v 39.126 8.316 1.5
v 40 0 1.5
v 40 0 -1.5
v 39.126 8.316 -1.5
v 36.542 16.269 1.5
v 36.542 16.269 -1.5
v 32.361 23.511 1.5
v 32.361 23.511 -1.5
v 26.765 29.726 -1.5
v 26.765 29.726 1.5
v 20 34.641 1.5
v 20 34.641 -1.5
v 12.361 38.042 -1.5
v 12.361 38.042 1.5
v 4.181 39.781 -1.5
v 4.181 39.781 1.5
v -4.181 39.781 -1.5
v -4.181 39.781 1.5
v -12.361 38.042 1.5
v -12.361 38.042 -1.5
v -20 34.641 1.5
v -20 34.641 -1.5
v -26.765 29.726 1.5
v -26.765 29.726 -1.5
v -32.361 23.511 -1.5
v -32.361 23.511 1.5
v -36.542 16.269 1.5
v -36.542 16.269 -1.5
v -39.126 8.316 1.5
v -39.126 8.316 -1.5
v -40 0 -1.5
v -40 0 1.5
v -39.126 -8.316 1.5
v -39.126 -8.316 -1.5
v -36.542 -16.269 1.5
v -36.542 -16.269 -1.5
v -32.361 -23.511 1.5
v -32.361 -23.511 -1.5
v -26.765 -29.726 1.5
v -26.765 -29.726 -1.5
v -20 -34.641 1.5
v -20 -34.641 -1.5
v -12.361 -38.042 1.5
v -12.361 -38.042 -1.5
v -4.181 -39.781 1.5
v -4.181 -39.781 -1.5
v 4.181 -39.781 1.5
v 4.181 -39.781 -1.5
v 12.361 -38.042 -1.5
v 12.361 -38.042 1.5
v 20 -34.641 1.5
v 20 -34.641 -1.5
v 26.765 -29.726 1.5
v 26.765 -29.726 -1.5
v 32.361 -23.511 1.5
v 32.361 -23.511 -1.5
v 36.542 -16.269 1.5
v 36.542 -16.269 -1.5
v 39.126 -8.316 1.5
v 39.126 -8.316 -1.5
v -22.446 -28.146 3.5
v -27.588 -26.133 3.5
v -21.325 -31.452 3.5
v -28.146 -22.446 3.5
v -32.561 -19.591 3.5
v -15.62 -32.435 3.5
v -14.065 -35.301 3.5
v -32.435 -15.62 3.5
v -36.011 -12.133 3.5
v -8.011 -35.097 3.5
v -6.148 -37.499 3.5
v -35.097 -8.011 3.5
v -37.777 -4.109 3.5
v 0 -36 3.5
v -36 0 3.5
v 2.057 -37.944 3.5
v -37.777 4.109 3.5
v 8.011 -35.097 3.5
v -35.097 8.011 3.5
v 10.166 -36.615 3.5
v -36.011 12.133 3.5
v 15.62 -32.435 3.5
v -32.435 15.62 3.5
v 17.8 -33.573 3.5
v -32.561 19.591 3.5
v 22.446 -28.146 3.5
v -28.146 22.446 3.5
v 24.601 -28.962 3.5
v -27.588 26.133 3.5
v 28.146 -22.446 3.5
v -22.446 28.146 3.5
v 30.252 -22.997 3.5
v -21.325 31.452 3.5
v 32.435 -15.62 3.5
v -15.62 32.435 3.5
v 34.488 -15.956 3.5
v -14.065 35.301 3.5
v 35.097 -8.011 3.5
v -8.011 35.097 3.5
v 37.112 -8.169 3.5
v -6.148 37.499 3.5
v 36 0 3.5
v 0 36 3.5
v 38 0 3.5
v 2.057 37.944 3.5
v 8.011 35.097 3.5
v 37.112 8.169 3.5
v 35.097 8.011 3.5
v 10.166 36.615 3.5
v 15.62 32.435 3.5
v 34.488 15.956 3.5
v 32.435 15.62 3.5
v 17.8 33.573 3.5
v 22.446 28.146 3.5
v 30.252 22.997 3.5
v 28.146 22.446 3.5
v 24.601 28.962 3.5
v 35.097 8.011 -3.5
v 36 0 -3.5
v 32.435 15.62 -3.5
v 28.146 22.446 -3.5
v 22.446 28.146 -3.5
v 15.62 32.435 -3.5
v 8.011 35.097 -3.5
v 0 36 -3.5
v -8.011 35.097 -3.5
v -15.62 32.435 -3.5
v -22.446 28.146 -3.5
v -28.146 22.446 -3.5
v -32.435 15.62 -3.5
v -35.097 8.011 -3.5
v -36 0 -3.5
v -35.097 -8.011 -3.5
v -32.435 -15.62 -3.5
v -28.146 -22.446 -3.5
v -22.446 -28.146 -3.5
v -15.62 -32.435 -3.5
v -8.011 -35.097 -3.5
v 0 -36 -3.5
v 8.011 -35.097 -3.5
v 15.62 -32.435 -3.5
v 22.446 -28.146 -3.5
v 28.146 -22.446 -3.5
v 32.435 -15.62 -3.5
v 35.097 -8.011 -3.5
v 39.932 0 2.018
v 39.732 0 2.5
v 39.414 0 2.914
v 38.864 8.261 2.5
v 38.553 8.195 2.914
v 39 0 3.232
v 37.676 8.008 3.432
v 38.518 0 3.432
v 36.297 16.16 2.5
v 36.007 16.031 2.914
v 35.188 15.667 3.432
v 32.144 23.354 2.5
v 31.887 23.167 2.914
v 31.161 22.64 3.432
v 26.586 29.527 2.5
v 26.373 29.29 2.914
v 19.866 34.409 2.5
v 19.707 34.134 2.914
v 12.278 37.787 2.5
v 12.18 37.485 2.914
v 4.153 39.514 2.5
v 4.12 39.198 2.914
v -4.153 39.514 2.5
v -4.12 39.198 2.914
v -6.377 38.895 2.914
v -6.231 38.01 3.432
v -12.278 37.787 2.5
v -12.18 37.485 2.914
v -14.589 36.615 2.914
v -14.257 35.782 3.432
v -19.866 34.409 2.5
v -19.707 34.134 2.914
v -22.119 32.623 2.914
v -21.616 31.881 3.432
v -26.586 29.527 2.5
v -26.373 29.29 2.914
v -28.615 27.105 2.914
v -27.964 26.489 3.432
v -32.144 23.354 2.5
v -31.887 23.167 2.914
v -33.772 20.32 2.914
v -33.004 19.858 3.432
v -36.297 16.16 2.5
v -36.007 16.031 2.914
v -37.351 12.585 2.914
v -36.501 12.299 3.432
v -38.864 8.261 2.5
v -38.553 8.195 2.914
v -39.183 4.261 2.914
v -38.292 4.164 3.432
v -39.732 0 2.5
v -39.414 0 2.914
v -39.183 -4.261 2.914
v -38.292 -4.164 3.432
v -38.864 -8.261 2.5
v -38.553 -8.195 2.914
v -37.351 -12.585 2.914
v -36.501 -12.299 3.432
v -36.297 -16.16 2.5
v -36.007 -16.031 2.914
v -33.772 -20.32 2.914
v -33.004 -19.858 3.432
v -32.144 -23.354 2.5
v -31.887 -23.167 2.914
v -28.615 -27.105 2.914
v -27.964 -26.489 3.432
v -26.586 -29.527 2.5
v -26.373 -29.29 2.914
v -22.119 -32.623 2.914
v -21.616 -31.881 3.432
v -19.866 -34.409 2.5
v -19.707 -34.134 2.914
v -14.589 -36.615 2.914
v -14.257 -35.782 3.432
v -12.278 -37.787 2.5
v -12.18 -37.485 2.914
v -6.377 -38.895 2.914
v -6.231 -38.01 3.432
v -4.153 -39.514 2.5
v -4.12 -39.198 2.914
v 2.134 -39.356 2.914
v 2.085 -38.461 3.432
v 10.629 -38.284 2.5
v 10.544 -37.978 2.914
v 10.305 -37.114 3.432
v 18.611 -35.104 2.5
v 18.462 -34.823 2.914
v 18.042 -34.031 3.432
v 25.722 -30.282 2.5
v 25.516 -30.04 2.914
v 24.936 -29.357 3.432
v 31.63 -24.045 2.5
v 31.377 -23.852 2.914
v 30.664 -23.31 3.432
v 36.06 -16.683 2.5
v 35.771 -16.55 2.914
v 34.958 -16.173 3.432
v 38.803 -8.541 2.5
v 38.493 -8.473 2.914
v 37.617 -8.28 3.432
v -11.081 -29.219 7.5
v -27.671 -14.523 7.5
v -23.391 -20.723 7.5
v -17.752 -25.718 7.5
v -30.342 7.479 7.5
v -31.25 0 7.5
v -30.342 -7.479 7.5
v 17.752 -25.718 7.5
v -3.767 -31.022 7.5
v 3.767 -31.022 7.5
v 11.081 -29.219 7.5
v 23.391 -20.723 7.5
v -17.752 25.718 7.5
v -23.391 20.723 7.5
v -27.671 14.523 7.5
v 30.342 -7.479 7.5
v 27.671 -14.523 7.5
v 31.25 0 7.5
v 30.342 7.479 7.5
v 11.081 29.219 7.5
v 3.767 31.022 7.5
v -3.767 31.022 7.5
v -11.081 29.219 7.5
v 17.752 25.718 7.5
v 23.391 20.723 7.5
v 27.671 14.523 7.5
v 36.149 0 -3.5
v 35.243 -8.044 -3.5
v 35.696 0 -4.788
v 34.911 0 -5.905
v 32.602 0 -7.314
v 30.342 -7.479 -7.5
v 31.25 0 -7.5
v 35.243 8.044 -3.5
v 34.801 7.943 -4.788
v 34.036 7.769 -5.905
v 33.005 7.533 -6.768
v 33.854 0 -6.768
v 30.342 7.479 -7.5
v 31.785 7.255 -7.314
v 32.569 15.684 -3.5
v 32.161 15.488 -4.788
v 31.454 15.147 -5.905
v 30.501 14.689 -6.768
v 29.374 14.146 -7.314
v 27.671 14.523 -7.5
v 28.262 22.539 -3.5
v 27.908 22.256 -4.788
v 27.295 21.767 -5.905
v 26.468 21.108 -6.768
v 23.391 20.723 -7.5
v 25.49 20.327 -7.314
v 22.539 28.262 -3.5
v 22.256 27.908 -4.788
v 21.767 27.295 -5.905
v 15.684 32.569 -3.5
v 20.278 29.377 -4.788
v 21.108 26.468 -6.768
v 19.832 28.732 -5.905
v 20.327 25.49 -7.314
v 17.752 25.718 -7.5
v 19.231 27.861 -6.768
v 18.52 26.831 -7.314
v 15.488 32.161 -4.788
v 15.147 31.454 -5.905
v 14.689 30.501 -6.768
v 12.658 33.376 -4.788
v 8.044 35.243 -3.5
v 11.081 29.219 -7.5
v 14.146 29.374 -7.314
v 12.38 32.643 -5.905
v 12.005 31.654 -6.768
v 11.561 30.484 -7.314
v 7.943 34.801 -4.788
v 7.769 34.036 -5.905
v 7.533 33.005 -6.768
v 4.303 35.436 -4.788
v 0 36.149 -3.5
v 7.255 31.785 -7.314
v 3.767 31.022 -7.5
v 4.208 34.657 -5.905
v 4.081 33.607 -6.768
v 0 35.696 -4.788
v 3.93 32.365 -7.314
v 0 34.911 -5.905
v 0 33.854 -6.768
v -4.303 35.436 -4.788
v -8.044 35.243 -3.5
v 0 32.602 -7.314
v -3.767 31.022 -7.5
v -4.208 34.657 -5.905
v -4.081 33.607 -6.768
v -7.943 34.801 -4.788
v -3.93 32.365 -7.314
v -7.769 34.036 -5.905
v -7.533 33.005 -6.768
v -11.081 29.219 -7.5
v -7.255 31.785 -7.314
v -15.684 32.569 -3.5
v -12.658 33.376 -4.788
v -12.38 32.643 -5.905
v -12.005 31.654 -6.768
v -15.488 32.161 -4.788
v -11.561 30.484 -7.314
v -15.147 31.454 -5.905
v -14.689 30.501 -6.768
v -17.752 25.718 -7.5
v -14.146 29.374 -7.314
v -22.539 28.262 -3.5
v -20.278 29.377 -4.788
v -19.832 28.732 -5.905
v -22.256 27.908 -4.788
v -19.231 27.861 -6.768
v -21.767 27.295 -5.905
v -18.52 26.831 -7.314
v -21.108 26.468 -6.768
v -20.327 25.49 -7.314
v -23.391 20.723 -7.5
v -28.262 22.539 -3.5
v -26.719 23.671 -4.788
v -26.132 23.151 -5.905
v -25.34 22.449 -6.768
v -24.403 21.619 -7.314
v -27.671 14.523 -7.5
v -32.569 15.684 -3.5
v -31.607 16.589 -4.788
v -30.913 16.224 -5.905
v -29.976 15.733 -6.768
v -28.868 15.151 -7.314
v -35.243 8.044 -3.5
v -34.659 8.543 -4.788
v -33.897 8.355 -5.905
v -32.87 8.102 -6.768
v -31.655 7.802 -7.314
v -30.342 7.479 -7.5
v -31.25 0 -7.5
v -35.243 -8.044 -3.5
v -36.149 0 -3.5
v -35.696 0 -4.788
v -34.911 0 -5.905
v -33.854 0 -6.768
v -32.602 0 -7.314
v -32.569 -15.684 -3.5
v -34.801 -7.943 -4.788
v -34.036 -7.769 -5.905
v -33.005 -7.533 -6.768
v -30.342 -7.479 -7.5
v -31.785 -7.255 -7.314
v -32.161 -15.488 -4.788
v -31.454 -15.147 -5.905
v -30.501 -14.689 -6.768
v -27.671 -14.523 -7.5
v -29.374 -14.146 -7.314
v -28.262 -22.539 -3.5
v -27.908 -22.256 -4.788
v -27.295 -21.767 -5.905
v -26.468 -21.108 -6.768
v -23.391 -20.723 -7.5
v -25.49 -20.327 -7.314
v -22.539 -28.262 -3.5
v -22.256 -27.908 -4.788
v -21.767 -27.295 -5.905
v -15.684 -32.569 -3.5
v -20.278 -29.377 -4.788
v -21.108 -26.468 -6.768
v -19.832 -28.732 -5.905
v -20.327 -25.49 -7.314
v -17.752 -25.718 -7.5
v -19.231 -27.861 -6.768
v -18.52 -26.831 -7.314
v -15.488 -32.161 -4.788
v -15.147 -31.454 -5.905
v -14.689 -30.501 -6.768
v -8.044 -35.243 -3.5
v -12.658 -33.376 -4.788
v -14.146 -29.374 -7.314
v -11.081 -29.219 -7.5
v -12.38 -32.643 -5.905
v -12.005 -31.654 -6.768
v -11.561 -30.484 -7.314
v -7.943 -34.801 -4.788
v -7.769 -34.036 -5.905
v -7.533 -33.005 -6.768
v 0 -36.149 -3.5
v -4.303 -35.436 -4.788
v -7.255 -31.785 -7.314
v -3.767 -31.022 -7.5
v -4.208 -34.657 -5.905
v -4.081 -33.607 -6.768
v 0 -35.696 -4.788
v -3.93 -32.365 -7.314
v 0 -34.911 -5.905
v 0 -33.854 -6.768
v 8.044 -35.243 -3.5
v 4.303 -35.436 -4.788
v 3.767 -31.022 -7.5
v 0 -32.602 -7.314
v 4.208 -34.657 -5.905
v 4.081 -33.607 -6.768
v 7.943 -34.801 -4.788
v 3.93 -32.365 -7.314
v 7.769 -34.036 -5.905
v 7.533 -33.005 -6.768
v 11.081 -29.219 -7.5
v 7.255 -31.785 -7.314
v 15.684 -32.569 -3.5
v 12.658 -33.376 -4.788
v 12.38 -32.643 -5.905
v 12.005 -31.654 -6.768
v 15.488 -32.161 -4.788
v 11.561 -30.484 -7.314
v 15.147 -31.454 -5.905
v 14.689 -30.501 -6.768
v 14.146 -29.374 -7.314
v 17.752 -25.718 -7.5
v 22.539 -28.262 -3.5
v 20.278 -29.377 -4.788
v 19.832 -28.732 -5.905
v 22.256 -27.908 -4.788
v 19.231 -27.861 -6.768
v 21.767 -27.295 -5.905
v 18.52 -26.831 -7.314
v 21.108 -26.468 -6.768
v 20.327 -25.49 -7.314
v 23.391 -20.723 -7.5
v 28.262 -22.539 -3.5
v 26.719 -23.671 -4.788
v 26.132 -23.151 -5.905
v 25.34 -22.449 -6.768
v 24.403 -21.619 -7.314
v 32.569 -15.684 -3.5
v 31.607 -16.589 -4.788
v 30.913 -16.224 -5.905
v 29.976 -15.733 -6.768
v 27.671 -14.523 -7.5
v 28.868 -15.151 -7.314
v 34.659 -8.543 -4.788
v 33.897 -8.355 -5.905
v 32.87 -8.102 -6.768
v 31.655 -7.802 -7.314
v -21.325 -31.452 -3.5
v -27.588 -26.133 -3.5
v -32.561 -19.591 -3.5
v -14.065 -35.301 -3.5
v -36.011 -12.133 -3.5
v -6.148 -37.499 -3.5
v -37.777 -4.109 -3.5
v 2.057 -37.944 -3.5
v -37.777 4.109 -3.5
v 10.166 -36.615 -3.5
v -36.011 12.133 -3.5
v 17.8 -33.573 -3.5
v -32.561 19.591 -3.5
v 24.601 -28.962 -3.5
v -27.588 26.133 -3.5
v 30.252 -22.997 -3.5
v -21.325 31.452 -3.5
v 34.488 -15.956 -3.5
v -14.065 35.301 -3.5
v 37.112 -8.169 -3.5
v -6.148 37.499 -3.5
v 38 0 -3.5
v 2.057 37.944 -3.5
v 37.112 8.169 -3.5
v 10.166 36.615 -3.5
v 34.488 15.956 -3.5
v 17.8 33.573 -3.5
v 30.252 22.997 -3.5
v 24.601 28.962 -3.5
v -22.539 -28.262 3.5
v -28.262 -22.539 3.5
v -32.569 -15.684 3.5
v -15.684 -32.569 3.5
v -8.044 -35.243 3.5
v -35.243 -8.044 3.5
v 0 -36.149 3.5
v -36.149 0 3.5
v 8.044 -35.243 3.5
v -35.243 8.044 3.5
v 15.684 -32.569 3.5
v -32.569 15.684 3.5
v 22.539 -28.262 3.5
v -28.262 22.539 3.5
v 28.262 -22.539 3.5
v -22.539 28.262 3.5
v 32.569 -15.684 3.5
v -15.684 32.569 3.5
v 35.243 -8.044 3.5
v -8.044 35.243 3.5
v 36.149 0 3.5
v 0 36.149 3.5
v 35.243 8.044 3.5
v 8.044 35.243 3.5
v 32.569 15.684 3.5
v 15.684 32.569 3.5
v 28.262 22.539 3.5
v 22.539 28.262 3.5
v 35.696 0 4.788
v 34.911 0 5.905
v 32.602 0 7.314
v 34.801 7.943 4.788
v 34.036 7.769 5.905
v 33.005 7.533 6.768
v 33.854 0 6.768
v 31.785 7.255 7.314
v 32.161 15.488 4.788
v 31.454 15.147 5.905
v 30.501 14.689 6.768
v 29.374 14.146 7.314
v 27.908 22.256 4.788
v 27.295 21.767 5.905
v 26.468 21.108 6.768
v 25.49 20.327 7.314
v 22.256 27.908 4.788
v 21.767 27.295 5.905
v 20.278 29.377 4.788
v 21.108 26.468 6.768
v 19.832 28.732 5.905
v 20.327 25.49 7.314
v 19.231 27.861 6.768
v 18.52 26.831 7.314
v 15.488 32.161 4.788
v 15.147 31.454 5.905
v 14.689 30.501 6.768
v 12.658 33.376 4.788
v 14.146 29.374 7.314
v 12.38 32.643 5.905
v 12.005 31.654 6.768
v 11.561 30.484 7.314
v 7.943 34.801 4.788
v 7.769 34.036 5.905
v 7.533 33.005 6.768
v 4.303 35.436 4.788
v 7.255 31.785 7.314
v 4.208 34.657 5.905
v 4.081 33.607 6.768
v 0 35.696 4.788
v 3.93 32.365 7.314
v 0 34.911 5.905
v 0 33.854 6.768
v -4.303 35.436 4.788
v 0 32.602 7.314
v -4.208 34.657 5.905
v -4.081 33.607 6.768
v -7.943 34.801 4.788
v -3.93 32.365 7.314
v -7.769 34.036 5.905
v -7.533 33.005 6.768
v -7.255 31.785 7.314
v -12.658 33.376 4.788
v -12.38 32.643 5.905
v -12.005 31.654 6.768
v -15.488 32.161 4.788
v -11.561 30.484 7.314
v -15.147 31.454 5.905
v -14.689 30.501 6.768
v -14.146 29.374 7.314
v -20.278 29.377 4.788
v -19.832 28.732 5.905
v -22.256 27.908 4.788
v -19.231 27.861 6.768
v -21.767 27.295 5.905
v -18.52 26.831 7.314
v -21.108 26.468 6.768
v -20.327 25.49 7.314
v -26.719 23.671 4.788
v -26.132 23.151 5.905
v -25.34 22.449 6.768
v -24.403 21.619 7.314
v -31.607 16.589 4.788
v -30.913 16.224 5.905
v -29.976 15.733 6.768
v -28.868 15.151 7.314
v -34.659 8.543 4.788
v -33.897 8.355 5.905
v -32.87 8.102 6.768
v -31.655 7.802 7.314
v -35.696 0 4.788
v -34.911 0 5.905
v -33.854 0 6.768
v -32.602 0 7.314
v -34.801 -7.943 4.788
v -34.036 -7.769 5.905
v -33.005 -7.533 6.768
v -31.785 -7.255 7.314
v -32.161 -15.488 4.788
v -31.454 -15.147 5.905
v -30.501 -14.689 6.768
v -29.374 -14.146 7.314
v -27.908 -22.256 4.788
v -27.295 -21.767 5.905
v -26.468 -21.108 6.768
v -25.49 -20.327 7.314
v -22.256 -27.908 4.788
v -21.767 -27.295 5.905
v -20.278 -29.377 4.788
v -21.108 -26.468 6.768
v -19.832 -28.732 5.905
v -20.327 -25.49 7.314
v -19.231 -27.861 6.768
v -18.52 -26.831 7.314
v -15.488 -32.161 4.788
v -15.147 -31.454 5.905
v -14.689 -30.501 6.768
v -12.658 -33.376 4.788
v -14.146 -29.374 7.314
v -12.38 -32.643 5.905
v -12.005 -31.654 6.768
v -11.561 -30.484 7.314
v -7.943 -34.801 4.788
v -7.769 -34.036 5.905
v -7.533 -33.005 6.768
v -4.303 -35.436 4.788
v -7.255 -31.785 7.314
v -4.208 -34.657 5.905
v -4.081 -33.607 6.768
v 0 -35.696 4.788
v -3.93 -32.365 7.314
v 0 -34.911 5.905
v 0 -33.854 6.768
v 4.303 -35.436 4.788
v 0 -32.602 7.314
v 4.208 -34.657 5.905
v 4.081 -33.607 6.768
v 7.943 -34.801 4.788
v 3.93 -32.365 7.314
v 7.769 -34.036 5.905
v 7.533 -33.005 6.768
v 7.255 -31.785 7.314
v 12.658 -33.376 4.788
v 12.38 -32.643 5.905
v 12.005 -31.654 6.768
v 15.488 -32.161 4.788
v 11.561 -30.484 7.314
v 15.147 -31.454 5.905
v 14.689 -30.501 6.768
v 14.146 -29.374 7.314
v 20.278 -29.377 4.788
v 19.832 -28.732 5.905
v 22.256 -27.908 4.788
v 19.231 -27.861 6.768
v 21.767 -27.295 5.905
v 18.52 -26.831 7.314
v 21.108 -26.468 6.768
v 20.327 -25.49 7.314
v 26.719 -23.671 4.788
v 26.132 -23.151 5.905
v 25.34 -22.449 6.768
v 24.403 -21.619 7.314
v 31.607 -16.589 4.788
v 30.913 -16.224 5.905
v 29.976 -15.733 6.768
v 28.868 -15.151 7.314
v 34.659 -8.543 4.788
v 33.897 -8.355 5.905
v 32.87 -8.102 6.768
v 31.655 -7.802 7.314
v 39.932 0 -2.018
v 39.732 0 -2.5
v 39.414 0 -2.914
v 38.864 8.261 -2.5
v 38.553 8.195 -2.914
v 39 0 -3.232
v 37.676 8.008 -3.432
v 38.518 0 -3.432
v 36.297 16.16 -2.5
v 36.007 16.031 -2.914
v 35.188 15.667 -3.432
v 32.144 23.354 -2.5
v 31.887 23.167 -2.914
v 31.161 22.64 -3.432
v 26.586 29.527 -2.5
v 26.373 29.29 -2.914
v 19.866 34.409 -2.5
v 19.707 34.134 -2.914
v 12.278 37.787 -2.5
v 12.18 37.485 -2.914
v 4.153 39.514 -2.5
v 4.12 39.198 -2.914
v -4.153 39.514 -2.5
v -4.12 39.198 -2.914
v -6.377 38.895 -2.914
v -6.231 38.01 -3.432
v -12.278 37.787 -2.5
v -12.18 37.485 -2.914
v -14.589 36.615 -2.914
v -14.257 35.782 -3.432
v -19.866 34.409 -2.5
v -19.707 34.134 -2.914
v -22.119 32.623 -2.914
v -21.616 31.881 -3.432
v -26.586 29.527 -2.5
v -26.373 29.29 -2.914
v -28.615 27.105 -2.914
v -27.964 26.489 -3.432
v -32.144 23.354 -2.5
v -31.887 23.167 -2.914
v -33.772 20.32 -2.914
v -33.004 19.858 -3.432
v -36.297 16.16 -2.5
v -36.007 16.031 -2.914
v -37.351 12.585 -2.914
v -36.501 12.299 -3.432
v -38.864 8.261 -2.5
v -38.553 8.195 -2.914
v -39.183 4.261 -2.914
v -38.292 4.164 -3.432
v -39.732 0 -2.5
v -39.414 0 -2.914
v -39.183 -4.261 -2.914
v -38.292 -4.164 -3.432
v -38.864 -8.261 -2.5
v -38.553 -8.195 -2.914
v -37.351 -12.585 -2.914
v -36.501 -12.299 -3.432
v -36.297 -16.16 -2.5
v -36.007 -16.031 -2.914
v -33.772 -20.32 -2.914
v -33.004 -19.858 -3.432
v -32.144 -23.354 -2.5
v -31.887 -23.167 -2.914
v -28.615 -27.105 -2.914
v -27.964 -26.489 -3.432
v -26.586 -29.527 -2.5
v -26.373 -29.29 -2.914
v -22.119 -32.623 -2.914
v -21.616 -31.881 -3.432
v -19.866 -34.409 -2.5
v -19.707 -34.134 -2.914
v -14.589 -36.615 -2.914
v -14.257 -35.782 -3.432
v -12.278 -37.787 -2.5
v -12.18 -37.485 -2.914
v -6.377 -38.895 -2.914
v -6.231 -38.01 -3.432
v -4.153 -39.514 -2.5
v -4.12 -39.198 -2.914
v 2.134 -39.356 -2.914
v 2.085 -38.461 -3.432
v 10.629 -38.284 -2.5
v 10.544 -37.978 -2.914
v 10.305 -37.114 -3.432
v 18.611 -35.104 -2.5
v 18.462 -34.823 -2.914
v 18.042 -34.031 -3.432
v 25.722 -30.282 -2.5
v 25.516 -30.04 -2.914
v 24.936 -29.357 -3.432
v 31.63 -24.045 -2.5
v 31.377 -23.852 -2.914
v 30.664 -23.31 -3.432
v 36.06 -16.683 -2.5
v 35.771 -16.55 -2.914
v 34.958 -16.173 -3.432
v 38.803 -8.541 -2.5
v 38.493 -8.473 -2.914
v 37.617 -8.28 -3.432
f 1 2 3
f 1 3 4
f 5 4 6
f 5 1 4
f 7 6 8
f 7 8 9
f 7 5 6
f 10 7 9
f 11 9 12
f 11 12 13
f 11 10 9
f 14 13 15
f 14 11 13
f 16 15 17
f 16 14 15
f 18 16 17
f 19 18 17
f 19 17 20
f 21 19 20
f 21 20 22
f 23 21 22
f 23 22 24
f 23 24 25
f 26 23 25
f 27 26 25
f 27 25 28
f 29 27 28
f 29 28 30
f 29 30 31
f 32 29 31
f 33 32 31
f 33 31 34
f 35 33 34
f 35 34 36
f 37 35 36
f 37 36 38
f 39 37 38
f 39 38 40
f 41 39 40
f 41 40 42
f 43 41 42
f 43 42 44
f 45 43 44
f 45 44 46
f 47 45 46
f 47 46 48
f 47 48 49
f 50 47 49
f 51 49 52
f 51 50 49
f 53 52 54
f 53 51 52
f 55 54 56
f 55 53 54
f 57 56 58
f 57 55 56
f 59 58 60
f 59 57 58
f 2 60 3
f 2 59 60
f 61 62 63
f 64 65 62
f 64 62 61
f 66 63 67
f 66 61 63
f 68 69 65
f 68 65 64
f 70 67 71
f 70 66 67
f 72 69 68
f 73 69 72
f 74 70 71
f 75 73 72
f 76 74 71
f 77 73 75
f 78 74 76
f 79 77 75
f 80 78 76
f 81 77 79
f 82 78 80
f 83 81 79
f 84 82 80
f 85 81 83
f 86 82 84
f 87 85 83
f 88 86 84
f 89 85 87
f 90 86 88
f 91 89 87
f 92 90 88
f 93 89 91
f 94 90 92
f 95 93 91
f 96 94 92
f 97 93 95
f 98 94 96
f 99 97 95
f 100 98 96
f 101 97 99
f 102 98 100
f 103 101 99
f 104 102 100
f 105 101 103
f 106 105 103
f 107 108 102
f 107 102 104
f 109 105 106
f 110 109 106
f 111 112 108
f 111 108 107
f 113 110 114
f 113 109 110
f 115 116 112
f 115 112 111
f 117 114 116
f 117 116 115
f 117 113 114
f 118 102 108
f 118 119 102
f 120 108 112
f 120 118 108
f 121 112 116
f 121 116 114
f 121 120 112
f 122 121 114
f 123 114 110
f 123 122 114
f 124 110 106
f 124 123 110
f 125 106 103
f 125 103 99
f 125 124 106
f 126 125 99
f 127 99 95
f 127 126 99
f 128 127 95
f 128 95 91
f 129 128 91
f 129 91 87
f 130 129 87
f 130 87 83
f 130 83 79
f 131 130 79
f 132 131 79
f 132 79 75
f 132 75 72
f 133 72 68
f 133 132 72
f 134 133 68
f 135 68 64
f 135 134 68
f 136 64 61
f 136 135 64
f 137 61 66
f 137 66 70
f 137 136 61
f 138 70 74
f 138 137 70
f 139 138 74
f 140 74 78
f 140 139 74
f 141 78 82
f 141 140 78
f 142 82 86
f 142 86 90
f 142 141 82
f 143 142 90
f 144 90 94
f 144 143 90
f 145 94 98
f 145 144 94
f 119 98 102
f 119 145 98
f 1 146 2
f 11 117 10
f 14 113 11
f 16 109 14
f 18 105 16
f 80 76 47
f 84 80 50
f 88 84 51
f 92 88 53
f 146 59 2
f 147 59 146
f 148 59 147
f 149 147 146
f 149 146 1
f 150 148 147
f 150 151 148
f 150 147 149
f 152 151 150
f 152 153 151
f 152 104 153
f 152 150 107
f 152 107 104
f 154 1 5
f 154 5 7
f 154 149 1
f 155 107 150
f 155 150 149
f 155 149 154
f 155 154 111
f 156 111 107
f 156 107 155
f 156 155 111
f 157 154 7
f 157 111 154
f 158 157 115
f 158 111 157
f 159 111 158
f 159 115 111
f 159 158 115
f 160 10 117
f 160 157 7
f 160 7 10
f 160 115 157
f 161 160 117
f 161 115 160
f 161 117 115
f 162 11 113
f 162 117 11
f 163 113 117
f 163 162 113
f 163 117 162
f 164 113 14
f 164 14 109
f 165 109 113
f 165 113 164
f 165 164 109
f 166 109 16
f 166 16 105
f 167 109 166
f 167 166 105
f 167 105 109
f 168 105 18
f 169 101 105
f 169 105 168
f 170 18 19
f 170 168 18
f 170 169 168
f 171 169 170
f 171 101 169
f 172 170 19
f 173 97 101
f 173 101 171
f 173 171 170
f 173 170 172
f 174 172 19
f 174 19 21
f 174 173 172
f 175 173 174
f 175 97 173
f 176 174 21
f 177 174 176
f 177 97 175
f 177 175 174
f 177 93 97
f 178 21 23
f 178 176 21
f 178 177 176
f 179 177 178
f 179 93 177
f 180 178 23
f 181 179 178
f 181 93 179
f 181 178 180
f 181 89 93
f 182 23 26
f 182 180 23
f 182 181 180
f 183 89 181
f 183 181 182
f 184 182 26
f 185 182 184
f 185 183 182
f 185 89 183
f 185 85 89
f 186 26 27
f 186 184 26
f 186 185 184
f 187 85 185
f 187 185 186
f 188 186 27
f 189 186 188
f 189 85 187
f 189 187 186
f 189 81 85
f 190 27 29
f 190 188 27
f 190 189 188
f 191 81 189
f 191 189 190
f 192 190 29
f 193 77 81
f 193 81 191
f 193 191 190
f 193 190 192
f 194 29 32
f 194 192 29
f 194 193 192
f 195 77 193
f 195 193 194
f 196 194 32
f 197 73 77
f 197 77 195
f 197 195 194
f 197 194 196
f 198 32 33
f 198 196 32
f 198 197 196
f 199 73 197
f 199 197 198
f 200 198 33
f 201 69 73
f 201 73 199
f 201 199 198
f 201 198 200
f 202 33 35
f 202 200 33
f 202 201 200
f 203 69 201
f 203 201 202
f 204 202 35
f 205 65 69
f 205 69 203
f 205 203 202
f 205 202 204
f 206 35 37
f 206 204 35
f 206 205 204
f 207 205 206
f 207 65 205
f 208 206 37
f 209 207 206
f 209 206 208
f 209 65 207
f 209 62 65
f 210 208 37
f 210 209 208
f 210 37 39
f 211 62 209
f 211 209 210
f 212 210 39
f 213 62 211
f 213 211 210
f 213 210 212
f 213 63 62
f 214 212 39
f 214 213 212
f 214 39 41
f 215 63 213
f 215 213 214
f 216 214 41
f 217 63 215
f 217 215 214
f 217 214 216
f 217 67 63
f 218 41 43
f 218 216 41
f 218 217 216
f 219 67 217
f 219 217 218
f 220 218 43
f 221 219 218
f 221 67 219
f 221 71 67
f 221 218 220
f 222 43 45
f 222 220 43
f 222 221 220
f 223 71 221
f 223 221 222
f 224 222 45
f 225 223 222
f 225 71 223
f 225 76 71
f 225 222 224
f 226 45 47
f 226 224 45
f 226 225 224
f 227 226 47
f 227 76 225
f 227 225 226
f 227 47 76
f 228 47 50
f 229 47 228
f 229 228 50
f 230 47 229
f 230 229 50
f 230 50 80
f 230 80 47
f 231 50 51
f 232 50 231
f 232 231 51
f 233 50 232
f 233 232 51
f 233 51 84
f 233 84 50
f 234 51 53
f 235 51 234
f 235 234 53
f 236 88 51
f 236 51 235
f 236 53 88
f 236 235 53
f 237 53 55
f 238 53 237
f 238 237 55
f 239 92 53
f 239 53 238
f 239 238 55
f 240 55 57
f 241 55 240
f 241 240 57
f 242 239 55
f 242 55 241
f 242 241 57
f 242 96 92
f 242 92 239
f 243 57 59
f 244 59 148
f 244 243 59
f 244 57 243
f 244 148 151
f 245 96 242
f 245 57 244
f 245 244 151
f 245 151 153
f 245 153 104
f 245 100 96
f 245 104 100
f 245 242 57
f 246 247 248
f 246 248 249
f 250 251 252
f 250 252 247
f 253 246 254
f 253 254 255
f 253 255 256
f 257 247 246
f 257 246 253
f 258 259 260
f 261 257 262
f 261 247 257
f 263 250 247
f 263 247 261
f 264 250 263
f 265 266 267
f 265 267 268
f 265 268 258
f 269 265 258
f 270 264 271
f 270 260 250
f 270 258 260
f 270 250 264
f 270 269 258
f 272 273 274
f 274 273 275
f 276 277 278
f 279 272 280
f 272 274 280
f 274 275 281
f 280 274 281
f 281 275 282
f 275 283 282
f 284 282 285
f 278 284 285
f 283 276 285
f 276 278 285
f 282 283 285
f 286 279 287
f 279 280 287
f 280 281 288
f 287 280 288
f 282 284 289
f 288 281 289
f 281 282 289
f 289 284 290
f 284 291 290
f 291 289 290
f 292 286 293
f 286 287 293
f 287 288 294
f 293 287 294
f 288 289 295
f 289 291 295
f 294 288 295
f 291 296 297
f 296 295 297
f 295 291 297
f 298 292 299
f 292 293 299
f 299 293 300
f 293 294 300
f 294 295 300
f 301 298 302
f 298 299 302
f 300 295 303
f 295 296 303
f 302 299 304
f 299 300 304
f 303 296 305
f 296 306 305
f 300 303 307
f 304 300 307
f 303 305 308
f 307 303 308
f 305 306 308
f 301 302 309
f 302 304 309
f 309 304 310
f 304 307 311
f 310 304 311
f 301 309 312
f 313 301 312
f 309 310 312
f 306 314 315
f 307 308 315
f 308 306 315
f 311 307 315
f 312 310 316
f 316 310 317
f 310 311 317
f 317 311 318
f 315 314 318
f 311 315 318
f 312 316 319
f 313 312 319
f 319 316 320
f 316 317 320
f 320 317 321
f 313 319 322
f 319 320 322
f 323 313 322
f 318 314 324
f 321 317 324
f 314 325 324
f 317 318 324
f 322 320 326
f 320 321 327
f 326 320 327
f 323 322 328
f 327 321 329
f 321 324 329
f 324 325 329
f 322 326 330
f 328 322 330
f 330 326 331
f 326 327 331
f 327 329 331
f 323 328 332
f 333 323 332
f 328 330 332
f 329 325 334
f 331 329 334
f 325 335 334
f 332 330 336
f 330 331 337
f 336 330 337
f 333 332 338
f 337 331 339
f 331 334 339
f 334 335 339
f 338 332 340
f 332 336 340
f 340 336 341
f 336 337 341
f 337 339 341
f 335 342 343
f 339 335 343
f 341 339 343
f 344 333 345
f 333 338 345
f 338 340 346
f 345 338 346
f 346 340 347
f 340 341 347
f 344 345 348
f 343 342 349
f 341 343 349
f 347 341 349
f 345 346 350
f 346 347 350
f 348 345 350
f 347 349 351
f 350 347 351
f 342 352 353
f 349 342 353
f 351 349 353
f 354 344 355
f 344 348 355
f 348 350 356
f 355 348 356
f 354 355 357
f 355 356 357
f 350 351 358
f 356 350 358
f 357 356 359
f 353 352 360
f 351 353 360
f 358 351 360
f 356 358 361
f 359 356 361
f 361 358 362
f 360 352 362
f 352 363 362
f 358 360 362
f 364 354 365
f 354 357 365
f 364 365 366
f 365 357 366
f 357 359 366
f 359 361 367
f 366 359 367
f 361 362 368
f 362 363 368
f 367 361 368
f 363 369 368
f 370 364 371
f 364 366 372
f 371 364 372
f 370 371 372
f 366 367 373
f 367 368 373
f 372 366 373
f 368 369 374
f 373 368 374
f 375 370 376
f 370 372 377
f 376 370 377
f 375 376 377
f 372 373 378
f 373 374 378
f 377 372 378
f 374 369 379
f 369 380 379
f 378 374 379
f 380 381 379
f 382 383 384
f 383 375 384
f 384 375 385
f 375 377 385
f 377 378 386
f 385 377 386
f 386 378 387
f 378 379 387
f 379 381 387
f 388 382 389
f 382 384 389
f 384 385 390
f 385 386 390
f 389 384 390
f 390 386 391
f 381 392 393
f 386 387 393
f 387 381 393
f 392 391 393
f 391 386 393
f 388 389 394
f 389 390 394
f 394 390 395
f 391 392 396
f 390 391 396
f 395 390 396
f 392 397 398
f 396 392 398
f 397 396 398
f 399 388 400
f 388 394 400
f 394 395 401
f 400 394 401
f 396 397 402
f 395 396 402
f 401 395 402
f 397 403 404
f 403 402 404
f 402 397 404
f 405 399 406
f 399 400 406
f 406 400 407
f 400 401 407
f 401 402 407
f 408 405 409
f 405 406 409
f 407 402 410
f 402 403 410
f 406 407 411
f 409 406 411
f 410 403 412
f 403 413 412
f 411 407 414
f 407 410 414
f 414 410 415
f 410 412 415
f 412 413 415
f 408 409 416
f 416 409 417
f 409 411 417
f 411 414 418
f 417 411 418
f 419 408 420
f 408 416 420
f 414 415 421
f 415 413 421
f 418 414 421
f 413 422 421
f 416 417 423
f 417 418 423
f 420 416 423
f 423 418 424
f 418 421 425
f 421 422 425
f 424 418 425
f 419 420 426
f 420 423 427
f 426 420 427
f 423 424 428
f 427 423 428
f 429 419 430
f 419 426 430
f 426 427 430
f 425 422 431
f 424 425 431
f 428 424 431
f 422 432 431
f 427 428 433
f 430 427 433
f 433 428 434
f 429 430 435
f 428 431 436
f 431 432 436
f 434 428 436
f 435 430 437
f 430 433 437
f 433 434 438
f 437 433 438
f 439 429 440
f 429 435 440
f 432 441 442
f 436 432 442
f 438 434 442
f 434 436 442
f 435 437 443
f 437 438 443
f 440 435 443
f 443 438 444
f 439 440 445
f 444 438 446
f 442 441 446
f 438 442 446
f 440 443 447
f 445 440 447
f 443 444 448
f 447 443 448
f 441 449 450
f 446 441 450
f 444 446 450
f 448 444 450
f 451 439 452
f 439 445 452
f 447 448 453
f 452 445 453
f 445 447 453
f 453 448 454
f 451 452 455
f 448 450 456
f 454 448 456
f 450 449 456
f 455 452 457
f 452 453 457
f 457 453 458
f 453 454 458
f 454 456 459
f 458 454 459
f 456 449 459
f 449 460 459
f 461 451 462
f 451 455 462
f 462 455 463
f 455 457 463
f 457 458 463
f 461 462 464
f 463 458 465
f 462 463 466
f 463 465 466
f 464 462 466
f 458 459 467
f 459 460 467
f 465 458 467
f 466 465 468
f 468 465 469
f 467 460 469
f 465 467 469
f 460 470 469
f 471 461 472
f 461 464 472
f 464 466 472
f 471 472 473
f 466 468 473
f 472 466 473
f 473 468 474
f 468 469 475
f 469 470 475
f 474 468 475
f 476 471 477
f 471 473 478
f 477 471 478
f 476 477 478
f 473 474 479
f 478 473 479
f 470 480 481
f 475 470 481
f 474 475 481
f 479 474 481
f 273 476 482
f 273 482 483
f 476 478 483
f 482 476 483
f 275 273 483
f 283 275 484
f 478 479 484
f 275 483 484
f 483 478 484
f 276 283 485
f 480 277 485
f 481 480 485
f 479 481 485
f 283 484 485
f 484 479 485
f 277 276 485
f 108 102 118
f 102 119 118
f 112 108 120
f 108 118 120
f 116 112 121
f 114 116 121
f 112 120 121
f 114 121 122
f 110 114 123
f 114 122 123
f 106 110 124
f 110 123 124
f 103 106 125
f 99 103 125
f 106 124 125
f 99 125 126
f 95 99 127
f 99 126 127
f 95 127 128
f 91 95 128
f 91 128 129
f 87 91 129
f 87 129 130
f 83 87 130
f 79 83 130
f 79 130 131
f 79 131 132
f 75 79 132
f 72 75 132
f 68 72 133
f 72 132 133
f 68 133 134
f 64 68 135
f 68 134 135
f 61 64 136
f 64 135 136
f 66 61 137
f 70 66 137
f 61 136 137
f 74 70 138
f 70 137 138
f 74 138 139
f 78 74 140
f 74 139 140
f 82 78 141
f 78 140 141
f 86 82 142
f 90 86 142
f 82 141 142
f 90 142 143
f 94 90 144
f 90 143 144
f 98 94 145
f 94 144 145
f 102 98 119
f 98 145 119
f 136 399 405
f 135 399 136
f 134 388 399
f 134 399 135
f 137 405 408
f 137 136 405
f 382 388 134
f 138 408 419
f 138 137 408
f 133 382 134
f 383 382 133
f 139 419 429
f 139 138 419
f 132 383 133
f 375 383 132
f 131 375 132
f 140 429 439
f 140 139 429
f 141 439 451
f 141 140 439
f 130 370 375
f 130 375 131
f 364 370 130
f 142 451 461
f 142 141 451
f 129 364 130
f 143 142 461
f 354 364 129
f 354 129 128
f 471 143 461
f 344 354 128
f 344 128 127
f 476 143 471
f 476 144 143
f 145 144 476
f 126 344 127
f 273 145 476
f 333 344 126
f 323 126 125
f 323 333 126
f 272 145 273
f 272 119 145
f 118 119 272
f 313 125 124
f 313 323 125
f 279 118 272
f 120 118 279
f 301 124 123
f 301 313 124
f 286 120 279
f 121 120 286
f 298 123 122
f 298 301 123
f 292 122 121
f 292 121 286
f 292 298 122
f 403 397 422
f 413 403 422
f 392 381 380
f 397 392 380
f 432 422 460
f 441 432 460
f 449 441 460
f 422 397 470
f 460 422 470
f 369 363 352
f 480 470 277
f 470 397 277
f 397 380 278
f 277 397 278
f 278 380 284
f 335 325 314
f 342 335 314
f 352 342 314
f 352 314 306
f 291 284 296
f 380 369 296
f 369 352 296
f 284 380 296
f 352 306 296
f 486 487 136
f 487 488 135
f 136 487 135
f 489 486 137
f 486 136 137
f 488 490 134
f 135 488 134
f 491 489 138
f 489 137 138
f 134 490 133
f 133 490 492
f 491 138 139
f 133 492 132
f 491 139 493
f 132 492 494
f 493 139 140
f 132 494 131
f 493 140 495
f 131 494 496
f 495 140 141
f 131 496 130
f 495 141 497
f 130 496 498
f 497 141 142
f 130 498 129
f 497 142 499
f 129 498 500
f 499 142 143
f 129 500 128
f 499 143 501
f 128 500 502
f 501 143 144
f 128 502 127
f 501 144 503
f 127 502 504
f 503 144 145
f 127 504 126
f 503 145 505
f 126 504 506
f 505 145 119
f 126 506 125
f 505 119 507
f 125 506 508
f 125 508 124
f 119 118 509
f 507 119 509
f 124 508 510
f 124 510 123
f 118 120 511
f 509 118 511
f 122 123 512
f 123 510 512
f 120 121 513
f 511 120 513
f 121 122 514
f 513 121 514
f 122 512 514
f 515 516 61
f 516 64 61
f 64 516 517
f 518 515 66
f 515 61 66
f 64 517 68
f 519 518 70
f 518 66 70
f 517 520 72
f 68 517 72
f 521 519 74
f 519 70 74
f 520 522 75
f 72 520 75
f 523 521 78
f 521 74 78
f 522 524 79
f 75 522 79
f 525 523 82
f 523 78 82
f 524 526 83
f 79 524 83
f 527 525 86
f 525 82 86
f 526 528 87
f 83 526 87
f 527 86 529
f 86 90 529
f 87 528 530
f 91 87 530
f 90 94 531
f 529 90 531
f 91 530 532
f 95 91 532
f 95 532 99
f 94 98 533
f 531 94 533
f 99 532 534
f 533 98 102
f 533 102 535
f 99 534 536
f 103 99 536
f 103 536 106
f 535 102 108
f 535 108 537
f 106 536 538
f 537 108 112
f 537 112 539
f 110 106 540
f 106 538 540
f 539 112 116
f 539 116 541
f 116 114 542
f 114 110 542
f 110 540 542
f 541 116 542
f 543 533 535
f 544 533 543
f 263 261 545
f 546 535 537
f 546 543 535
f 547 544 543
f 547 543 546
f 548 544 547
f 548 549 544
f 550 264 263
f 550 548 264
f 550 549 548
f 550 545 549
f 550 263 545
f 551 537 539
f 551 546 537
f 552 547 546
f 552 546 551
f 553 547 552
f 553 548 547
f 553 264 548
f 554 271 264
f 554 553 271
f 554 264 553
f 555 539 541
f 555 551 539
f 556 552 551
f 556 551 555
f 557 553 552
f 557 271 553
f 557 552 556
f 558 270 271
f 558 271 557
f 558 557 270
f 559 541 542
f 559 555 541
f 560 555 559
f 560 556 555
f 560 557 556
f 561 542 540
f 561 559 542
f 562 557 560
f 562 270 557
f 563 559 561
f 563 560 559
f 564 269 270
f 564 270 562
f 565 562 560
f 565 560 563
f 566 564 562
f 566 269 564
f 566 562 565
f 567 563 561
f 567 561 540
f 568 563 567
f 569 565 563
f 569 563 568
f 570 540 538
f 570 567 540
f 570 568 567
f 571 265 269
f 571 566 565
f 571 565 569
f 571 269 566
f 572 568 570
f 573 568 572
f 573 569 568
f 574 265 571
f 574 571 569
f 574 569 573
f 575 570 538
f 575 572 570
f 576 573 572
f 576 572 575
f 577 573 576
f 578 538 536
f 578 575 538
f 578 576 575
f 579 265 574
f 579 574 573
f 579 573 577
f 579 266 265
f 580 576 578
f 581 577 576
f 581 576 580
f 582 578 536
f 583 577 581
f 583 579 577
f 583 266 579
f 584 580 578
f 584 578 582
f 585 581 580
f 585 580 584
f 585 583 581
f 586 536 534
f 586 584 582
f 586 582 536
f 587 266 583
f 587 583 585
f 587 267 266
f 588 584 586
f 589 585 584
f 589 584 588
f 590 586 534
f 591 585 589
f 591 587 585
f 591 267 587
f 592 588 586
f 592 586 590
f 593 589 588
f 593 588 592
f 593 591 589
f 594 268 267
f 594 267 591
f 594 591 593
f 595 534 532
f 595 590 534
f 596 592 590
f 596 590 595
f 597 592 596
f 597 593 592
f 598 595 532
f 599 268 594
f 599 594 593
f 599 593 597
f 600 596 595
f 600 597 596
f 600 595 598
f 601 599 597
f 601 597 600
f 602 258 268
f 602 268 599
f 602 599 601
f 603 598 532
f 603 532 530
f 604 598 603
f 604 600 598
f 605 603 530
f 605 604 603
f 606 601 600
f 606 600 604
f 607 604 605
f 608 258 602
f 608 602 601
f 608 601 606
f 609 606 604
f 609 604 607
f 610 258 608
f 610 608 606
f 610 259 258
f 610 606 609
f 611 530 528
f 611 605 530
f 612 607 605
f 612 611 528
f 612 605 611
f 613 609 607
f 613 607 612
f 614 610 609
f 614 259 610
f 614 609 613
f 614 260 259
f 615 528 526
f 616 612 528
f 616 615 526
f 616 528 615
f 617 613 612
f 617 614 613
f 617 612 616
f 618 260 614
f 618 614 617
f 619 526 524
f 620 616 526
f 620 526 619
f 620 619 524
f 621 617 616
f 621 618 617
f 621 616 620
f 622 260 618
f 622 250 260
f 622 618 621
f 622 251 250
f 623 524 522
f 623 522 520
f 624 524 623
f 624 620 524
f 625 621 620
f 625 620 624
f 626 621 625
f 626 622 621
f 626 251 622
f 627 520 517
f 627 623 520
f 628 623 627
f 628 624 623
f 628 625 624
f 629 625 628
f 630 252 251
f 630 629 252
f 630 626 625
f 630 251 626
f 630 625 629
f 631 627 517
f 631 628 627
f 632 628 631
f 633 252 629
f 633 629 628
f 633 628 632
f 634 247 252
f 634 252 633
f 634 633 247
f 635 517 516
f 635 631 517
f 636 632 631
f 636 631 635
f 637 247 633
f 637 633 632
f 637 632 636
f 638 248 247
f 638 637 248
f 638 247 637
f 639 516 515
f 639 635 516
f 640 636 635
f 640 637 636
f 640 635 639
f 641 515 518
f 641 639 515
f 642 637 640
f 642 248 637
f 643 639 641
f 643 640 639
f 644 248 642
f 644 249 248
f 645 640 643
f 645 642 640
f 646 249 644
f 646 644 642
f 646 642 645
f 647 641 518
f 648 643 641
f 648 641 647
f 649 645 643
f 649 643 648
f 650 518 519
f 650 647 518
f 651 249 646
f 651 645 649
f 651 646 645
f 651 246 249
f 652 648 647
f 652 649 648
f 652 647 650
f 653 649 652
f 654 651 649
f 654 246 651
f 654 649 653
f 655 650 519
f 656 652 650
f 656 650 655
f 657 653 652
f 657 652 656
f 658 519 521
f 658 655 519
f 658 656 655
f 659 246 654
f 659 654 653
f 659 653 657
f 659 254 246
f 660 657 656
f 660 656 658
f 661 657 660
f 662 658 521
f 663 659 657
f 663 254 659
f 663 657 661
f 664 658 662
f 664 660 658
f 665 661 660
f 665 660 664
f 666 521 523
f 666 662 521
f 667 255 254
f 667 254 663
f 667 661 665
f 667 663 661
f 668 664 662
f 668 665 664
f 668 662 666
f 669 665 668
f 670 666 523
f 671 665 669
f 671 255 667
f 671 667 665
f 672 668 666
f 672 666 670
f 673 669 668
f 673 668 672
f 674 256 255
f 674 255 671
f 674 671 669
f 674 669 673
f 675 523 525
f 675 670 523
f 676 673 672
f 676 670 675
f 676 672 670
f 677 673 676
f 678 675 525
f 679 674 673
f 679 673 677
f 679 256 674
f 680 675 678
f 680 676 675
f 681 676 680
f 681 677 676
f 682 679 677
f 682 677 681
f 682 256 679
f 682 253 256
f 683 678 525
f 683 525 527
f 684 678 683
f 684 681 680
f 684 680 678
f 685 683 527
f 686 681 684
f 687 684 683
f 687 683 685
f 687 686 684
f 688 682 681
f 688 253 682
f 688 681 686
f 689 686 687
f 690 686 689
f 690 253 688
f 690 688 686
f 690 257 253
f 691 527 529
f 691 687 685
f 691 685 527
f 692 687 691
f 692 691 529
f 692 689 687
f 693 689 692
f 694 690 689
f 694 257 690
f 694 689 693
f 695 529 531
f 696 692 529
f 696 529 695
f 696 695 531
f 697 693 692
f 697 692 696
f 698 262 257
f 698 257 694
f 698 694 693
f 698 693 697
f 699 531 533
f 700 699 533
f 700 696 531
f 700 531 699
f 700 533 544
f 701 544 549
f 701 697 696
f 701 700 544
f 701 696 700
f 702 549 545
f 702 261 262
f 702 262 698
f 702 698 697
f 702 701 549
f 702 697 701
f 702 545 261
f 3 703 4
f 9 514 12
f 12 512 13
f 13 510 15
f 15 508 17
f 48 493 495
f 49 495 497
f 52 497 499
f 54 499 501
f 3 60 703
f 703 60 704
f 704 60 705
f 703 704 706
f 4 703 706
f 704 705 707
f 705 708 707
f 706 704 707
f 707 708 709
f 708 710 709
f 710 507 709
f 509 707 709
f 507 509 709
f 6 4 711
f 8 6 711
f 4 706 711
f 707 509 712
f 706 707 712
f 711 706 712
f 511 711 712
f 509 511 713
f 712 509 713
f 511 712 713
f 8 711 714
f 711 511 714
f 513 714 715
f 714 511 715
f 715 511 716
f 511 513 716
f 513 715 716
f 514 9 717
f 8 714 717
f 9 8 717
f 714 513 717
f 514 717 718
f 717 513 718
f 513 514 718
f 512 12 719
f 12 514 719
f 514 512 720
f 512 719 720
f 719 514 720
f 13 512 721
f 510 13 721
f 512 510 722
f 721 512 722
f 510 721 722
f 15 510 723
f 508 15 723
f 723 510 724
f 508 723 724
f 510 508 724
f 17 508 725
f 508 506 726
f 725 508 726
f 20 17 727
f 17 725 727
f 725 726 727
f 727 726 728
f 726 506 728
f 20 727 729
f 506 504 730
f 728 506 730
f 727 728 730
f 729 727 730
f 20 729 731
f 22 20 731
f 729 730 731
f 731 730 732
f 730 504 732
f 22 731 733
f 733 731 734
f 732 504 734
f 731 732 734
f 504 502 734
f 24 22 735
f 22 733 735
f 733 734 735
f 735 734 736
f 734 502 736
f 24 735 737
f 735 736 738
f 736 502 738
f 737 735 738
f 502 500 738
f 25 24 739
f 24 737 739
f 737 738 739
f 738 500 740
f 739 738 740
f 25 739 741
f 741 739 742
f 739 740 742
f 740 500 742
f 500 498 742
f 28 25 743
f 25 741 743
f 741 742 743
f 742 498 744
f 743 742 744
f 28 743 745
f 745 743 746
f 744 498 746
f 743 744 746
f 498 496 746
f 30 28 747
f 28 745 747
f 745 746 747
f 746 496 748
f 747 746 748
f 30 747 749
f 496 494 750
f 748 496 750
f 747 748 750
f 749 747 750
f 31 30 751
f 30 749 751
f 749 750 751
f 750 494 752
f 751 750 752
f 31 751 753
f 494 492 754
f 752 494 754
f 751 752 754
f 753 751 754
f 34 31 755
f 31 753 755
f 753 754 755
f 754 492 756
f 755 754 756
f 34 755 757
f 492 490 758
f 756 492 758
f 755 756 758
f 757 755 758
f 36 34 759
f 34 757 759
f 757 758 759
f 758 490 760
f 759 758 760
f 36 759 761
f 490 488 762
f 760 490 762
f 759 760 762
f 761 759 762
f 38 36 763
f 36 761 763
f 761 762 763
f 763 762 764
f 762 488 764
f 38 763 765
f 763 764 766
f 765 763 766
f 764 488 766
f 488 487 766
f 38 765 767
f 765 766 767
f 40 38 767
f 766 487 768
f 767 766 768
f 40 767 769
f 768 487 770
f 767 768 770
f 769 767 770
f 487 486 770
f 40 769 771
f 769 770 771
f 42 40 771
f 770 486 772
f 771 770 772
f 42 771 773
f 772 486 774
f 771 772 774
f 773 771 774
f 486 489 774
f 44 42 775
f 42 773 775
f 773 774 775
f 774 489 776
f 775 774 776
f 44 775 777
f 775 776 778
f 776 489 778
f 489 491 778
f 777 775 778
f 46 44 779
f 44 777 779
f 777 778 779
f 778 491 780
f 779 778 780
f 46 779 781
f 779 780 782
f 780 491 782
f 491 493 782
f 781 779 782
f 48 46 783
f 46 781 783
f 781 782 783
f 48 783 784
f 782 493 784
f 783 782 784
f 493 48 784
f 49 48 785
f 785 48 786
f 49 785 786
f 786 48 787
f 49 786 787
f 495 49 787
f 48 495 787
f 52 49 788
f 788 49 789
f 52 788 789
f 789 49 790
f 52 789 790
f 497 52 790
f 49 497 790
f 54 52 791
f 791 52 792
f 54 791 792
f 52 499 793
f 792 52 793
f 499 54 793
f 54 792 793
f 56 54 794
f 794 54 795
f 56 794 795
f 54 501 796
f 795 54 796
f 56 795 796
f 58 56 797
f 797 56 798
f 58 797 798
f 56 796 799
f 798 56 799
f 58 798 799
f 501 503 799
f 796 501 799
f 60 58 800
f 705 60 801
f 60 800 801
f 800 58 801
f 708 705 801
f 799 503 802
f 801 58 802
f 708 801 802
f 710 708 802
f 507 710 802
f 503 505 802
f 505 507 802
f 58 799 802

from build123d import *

# Parameters (mm, degrees)
F2_R     = 40
F2_R_2   = 36
F3_DEPTH = 3.5
F4_R     = 36.25
F5_DEPTH = 7.5
F6_R     = 5
F9_R     = 2


with BuildPart() as f3:
    # F2 (on Top) → F3 (new body, symmetric)
    with BuildSketch(Plane.XY):
        Circle(F2_R)
        Circle(F2_R_2, mode=Mode.SUBTRACT)
    extrude(amount=F3_DEPTH, both=True)


with BuildPart() as f5:
    # F4 (on Top) → F5 (new body, symmetric)
    with BuildSketch(Plane.XY):
        Circle(F4_R)
    extrude(amount=F5_DEPTH, both=True)

    # F6
    f6_edges = [f5.edges().sort_by_distance(p)[0] for p in [
        (-36.25, 0, 7.5),
        (-36.25, 0, -7.5),
    ]]
    fillet(f6_edges, radius=F6_R)


with BuildPart() as f7_1:
    # F7: copy of F3
    add(f3.part)


with BuildPart() as f5_1:
    add(f5.part)

    # F8: cut F7_1
    add(f7_1.part, mode=Mode.SUBTRACT)


with BuildPart() as f3_1:
    add(f3.part)

    # F9
    f9_edges = [f3_1.edges().sort_by_distance(p)[0] for p in [
        (-40, 0, -3.5),
        (40, 0, 0),
        (-40, 0, 3.5),
    ]]
    fillet(f9_edges, radius=F9_R)


solid = Compound([f5_1.part, f3_1.part])
